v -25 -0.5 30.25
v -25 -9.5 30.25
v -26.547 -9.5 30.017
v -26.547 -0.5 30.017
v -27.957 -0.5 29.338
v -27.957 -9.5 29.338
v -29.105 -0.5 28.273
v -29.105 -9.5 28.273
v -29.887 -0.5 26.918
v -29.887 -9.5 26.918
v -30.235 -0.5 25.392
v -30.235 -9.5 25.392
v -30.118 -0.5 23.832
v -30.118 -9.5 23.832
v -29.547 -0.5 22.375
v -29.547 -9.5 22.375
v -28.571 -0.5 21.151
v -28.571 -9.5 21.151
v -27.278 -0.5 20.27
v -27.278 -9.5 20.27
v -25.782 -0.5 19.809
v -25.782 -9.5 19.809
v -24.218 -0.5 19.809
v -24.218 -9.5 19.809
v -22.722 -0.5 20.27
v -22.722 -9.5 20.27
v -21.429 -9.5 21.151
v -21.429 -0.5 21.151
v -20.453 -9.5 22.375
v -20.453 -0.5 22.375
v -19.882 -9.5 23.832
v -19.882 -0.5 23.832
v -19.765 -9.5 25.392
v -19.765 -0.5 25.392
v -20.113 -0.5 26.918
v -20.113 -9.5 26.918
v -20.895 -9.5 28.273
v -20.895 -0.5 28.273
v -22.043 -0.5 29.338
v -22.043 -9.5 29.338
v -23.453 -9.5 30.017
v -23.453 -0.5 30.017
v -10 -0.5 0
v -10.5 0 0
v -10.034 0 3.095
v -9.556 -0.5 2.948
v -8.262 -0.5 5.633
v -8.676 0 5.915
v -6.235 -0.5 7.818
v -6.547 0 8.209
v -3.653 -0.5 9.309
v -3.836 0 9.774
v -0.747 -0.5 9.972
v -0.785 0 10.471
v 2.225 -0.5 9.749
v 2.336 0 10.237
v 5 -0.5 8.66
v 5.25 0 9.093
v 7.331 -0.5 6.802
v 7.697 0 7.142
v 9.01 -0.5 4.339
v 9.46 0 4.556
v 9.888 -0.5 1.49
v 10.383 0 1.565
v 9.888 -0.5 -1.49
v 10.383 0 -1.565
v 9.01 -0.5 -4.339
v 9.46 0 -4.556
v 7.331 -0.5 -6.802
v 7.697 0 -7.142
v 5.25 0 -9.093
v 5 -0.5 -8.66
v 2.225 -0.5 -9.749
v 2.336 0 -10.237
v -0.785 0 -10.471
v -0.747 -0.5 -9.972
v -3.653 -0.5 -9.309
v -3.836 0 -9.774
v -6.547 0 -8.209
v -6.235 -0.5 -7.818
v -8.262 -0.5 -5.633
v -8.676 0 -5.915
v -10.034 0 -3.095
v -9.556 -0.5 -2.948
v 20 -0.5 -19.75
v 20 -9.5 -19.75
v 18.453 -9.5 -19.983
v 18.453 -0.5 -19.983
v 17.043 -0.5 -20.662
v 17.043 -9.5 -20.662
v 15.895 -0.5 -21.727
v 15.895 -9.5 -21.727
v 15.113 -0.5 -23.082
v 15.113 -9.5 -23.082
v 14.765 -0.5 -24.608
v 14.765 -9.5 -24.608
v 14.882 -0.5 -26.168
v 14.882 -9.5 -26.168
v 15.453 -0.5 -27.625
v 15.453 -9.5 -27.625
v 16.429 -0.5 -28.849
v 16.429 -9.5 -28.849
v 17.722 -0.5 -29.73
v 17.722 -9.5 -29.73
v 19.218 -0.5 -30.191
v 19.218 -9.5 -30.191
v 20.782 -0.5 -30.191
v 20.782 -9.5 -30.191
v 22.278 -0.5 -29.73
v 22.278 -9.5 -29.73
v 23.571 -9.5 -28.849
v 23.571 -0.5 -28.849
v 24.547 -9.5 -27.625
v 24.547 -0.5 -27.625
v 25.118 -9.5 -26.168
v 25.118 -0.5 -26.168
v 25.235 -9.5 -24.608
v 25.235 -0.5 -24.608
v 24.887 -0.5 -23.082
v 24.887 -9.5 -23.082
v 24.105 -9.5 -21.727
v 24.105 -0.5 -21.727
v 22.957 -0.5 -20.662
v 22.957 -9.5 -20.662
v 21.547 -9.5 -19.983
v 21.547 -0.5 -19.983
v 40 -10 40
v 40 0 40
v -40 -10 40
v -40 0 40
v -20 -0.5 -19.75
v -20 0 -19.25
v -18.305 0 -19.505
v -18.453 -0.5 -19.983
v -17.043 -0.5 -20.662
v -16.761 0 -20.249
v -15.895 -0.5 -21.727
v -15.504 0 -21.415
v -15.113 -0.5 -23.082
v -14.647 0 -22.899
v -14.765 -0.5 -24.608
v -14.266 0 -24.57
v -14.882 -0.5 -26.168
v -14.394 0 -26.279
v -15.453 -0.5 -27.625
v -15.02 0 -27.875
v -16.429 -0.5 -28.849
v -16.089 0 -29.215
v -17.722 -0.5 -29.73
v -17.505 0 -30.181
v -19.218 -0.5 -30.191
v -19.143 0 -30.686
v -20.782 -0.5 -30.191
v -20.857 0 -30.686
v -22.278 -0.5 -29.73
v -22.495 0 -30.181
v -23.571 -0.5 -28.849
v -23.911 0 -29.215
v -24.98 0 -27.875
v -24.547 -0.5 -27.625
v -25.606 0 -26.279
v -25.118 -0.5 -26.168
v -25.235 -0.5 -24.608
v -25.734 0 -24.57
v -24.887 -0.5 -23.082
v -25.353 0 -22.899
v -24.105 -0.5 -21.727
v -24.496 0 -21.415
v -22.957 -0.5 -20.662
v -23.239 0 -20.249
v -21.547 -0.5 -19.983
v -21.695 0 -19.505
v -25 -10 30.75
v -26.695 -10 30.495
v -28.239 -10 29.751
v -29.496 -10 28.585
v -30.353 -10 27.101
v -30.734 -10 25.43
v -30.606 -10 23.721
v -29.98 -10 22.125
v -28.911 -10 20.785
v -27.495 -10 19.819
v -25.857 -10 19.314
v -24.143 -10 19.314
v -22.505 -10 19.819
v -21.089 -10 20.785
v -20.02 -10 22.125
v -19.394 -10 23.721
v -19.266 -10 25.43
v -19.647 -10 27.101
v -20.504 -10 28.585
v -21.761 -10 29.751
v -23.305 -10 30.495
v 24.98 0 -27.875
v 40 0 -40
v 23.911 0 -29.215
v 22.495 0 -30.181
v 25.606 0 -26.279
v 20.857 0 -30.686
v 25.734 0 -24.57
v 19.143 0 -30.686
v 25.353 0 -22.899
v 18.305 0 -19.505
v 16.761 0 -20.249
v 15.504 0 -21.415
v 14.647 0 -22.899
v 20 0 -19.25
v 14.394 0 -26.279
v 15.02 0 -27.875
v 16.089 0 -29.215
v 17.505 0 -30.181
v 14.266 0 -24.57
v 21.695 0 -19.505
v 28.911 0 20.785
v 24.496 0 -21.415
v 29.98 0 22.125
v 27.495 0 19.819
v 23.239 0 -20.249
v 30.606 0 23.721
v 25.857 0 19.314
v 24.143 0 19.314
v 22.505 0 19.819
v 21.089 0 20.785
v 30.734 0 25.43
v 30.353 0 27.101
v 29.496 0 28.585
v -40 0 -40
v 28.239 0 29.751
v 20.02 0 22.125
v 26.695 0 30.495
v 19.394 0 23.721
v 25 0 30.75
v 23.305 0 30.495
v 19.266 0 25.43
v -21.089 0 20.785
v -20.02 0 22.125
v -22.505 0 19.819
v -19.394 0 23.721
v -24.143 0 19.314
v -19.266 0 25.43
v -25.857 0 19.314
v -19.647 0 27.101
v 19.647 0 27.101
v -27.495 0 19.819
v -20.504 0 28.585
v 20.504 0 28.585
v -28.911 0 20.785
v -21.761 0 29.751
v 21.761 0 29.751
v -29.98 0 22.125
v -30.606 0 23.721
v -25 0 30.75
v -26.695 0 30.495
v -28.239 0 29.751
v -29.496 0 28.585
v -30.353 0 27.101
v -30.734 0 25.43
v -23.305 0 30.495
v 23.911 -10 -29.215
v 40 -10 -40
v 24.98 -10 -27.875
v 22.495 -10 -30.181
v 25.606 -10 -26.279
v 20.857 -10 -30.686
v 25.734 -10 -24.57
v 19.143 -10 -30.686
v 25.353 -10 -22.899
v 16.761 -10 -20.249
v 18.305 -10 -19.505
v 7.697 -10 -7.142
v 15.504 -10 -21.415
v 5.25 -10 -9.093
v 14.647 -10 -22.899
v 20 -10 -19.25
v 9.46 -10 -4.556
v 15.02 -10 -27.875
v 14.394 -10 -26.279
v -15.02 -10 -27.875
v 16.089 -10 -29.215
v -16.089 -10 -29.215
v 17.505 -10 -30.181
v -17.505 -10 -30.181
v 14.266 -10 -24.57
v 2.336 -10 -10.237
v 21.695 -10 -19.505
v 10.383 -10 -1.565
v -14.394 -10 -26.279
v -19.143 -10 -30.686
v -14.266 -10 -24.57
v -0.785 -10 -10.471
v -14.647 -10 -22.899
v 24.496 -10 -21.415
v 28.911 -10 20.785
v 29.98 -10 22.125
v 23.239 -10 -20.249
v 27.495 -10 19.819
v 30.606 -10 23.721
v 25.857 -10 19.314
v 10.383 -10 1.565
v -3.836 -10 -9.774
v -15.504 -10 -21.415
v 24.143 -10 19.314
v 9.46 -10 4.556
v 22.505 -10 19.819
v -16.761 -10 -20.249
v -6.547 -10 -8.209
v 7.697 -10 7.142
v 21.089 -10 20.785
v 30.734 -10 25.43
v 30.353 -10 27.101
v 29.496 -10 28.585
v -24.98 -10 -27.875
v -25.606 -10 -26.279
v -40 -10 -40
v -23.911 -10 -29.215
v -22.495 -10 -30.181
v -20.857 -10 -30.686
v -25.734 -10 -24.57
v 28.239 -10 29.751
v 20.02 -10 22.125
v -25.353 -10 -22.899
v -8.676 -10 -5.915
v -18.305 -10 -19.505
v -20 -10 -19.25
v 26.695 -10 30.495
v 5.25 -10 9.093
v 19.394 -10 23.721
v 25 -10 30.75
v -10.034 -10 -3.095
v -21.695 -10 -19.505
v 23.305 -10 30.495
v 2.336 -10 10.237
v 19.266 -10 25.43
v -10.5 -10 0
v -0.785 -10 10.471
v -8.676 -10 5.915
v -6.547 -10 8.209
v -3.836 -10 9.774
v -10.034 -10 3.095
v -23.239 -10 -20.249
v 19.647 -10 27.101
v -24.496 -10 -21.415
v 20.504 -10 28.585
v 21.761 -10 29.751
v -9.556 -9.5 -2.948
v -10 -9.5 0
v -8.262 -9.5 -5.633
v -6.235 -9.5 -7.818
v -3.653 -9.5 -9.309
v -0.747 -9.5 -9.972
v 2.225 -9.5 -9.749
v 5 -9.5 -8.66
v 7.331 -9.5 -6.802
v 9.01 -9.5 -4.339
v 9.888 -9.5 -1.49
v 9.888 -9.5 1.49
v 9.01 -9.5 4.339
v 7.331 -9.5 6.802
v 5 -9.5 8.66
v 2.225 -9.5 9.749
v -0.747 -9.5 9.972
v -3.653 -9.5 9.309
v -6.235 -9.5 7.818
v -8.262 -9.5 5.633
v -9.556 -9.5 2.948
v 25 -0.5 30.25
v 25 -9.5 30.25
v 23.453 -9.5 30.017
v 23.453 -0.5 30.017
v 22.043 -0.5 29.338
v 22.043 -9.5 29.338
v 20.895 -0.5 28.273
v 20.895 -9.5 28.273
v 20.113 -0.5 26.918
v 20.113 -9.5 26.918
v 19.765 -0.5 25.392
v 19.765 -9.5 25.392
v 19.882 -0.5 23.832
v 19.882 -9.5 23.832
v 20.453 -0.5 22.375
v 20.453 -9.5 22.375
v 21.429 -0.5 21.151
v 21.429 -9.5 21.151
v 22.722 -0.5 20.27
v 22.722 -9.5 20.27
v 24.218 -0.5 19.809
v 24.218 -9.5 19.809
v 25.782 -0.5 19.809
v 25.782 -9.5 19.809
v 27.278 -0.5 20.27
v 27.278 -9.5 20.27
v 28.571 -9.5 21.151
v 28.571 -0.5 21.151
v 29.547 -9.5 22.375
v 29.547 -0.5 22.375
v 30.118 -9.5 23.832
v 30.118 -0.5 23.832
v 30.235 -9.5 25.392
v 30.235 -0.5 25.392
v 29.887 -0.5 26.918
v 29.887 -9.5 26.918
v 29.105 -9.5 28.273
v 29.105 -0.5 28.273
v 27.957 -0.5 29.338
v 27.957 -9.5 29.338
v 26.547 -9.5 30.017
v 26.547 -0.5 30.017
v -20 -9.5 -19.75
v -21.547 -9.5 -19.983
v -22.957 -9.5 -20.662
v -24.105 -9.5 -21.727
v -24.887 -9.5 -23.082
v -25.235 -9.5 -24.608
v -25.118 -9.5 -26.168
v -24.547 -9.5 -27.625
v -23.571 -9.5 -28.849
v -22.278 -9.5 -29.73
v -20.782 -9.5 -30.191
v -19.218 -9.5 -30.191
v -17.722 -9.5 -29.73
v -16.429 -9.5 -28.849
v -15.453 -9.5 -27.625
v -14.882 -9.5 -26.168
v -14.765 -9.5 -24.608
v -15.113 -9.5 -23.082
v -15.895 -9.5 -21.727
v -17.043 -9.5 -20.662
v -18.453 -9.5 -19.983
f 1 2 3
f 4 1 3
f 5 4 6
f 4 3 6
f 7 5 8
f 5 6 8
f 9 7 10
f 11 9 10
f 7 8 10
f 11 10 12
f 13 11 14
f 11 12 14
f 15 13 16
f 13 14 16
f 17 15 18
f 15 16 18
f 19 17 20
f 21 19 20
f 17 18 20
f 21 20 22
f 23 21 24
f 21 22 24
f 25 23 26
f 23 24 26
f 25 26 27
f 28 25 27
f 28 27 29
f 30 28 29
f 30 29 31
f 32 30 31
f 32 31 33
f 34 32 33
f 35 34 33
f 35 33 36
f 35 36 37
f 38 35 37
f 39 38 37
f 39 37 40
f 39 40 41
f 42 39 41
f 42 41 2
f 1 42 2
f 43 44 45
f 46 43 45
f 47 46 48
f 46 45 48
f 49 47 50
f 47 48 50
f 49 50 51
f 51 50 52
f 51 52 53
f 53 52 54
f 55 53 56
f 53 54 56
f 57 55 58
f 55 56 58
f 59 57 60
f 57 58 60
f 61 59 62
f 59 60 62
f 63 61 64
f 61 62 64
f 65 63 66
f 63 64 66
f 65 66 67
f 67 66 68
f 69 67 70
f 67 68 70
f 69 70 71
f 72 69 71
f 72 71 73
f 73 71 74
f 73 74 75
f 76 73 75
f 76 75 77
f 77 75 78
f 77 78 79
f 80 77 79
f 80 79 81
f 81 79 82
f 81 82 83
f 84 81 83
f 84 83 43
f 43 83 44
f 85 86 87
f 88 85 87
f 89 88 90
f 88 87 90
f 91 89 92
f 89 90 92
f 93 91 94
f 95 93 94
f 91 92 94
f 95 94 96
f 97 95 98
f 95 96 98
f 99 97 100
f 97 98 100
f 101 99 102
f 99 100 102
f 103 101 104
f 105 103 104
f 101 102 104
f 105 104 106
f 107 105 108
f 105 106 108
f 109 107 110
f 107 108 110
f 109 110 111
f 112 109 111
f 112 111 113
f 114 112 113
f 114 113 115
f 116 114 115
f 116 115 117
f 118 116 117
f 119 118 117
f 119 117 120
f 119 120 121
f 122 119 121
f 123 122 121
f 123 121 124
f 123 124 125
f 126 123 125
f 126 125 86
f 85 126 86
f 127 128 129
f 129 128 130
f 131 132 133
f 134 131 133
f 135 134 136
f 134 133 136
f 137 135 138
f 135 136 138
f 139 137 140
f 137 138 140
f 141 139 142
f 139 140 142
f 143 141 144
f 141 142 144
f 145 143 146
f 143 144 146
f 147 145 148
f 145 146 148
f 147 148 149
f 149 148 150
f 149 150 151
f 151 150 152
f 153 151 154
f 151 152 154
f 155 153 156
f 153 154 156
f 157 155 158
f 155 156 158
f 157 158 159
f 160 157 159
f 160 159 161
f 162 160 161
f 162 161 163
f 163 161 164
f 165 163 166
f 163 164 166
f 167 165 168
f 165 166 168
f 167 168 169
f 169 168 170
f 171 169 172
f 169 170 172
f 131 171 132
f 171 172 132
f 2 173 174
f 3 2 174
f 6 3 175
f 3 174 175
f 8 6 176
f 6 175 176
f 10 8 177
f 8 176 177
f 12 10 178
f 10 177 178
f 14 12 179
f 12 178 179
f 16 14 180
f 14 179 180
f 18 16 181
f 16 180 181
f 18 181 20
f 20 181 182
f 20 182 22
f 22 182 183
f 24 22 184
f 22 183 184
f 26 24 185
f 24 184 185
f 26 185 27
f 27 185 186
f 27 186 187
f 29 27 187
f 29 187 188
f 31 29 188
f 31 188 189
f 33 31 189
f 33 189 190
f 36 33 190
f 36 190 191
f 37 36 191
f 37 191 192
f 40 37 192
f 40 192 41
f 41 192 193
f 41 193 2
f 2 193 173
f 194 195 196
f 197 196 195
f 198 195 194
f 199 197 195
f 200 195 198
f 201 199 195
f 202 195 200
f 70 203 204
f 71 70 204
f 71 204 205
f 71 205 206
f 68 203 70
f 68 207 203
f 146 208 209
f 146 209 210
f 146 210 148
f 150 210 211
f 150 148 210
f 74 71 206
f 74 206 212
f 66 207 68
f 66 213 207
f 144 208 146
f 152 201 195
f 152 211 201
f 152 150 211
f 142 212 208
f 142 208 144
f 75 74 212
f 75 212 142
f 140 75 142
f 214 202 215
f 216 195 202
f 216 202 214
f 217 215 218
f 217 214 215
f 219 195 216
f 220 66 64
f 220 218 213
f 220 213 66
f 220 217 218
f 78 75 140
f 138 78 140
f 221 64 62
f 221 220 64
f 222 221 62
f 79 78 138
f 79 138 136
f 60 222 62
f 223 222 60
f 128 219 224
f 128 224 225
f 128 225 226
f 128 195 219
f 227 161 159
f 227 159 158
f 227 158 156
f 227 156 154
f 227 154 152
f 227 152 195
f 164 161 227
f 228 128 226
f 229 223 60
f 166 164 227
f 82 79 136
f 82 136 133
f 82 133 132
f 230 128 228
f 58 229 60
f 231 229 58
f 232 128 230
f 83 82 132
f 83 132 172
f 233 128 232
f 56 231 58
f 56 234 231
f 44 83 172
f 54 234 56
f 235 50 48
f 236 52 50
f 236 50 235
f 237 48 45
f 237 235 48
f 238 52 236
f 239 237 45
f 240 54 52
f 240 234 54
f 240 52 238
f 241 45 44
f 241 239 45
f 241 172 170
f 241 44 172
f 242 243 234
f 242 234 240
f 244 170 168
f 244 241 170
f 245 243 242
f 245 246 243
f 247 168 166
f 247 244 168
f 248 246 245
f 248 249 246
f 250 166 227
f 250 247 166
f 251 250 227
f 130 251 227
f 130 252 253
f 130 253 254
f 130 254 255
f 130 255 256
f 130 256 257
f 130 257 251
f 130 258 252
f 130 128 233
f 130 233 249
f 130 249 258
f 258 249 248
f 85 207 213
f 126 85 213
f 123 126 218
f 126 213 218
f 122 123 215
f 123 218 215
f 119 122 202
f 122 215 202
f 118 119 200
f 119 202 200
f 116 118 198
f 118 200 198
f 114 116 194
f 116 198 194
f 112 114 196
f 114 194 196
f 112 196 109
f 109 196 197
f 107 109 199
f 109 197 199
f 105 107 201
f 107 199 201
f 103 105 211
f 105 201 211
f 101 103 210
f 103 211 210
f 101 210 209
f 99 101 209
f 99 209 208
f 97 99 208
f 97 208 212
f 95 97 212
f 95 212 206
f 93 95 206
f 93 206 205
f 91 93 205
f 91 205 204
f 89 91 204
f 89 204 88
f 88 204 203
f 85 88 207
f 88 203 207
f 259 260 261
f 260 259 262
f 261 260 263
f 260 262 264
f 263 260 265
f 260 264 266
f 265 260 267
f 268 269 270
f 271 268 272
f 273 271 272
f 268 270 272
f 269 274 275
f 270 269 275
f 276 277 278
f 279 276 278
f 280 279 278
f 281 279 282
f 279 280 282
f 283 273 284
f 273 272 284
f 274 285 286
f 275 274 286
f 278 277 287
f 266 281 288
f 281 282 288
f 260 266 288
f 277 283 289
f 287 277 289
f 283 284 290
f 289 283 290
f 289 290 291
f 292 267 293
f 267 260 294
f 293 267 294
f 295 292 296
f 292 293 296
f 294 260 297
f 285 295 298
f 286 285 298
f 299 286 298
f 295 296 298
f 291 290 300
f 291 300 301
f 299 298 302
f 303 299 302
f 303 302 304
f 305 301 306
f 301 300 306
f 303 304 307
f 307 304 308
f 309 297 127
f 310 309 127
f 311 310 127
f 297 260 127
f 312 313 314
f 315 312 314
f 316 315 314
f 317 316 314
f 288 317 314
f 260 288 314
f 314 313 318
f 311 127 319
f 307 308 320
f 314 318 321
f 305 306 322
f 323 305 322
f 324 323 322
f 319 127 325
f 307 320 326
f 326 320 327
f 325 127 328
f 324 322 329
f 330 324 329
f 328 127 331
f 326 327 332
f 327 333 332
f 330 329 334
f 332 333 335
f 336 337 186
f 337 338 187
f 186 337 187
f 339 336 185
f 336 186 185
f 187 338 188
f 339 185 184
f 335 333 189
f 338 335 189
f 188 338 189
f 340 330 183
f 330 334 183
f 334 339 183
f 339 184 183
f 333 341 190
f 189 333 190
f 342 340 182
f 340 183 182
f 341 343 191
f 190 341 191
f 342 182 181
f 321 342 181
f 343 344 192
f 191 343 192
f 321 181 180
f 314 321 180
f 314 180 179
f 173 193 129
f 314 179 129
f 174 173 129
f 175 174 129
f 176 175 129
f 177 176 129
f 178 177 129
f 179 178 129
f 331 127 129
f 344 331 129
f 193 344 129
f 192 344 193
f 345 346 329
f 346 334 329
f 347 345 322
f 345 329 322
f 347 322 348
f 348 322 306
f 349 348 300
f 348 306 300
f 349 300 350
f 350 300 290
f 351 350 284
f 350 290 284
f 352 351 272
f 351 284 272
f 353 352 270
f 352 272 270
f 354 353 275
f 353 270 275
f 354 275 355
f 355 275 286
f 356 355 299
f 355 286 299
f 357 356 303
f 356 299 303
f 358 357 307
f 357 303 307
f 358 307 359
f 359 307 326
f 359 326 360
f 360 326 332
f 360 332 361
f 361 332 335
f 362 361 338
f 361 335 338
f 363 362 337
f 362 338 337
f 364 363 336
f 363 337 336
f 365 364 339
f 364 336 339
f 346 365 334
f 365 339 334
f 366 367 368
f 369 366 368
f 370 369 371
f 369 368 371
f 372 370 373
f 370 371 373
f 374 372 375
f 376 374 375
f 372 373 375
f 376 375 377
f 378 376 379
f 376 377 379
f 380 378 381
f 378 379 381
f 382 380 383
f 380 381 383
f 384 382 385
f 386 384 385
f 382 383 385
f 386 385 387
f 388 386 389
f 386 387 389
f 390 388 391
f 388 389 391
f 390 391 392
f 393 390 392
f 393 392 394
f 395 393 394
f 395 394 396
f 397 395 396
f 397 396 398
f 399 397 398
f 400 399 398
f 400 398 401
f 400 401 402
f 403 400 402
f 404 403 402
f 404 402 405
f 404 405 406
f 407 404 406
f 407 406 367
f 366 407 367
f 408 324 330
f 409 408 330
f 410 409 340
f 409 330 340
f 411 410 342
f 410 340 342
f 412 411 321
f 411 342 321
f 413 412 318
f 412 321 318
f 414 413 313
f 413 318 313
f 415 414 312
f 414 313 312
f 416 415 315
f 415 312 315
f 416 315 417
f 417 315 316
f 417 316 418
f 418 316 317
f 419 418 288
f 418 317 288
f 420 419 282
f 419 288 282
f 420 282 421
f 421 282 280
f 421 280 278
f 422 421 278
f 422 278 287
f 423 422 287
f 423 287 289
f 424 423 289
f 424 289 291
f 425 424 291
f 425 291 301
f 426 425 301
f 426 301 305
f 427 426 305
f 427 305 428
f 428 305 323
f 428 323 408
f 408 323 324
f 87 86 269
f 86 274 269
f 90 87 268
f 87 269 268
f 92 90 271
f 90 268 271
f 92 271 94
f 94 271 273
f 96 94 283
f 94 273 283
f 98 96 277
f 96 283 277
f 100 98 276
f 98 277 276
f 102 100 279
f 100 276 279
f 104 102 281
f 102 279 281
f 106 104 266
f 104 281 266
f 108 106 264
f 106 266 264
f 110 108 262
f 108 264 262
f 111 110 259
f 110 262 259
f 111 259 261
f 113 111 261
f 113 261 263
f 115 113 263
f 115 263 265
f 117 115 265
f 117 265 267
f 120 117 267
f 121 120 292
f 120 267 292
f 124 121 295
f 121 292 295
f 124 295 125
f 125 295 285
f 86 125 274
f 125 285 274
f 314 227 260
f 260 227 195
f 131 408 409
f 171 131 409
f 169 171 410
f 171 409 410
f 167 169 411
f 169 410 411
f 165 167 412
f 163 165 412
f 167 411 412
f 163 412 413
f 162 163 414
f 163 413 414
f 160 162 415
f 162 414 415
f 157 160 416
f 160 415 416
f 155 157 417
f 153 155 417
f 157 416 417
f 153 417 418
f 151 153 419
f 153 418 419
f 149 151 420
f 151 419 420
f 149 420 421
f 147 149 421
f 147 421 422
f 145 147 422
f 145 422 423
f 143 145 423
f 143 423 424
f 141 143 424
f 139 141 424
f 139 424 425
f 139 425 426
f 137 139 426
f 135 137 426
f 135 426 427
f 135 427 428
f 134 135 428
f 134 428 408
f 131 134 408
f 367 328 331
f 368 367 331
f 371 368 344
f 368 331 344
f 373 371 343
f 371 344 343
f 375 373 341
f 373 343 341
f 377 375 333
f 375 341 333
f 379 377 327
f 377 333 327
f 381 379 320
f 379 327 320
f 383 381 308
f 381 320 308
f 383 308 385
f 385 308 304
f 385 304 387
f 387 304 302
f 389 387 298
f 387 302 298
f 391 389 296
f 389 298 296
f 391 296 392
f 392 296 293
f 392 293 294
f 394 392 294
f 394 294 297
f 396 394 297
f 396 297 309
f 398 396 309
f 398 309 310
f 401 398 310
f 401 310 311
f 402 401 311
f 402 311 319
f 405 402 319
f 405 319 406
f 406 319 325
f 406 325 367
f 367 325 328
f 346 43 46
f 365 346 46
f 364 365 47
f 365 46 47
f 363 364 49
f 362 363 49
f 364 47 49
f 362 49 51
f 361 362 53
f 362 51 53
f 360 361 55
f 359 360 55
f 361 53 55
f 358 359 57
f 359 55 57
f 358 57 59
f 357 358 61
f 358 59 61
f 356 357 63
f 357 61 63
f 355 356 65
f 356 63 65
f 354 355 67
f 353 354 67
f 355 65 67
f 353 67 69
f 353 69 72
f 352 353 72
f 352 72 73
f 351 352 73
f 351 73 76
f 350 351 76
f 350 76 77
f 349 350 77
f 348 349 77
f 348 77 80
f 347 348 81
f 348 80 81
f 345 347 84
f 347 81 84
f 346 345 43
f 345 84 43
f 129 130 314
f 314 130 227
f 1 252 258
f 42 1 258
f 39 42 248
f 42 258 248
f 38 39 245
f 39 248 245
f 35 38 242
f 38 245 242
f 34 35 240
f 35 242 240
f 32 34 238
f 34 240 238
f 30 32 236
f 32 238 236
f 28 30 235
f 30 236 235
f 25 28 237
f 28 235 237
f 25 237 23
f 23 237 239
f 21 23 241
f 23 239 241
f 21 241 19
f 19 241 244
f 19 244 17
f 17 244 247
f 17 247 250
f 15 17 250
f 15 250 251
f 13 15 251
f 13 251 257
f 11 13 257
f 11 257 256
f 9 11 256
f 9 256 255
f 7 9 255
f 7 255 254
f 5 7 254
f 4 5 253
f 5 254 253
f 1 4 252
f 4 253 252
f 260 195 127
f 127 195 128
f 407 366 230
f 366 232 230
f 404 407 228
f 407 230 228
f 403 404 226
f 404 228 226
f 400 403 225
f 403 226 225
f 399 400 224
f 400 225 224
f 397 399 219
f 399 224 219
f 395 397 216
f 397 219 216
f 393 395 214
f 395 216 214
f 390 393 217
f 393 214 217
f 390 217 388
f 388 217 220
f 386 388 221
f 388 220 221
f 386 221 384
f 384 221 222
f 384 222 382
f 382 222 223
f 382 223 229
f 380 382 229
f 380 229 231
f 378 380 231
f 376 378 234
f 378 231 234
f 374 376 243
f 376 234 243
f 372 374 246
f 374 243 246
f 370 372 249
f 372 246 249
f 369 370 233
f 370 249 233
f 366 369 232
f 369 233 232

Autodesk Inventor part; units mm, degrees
ref_plane "YZ Plane" through (0, 0, 0) normal (1, 0, 0) x (0, 1, 0)
ref_plane "XZ Plane" through (0, 0, 0) normal (0, 1, 0) x (-1, 0, 0)
ref_plane "XY Plane" through (0, 0, 0) normal (0, 0, 1) x (1, 0, 0)
sketch "Sketch1" plane through (0, 0, 0) normal (0, 1, 0) x (-1, 0, 0)
  line L0 (-40, 40) -> (40, 40)
  line L1 (40, 40) -> (40, -40)
  line L2 (40, -40) -> (-40, -40)
  line L3 (-40, -40) -> (-40, 40)
  line L4 (-40, 40) -> (40, -40) construction
  line L5 (40, 40) -> (-40, -40) construction
  line L6 (-25, 25) -> (25, 25) construction
  line L7 (25, 25) -> (25, -25) construction
  line L8 (25, -25) -> (-25, -25) construction
  line L9 (-25, -25) -> (-25, 25) construction
  line L10 (-25, 25) -> (25, -25) construction
  line L11 (25, 25) -> (-25, -25) construction
  line L12 (-20, 25) -> (20, 25) construction
  line L13 (20, 25) -> (20, -25) construction
  line L14 (20, -25) -> (-20, -25) construction
  line L15 (-20, -25) -> (-20, 25) construction
  line L16 (-20, 25) -> (20, -25) construction
  line L17 (20, 25) -> (-20, -25) construction
  circle A0 centre (0, 0) radius 10
  dimension "d0" = 80
  dimension "d1" = 50
  dimension "d2" = 40
  dimension "d3" = 20
extrude "Extrusion1" add sketch "Sketch1" against normal blind 10
hole "Hole1" at (-20, 0, -25) at (20, 0, -25) at (-25, 0, 25) at (25, 0, 25) direction (0, -1, 0) diameter 10.5 end through all
chamfer "Chamfer1" distance 0.5 angle 45 10 edges at (20, 0, -30.25) (-20, 0, -30.25) (25, 0, 19.75) (-25, 0, 19.75) (20, -10, -30.25) (-20, -10, -30.25) (25, -10, 19.75) (-25, -10, 19.75) (10, 0, 0) (10, -10, 0)
properties part number "AP1-002"
